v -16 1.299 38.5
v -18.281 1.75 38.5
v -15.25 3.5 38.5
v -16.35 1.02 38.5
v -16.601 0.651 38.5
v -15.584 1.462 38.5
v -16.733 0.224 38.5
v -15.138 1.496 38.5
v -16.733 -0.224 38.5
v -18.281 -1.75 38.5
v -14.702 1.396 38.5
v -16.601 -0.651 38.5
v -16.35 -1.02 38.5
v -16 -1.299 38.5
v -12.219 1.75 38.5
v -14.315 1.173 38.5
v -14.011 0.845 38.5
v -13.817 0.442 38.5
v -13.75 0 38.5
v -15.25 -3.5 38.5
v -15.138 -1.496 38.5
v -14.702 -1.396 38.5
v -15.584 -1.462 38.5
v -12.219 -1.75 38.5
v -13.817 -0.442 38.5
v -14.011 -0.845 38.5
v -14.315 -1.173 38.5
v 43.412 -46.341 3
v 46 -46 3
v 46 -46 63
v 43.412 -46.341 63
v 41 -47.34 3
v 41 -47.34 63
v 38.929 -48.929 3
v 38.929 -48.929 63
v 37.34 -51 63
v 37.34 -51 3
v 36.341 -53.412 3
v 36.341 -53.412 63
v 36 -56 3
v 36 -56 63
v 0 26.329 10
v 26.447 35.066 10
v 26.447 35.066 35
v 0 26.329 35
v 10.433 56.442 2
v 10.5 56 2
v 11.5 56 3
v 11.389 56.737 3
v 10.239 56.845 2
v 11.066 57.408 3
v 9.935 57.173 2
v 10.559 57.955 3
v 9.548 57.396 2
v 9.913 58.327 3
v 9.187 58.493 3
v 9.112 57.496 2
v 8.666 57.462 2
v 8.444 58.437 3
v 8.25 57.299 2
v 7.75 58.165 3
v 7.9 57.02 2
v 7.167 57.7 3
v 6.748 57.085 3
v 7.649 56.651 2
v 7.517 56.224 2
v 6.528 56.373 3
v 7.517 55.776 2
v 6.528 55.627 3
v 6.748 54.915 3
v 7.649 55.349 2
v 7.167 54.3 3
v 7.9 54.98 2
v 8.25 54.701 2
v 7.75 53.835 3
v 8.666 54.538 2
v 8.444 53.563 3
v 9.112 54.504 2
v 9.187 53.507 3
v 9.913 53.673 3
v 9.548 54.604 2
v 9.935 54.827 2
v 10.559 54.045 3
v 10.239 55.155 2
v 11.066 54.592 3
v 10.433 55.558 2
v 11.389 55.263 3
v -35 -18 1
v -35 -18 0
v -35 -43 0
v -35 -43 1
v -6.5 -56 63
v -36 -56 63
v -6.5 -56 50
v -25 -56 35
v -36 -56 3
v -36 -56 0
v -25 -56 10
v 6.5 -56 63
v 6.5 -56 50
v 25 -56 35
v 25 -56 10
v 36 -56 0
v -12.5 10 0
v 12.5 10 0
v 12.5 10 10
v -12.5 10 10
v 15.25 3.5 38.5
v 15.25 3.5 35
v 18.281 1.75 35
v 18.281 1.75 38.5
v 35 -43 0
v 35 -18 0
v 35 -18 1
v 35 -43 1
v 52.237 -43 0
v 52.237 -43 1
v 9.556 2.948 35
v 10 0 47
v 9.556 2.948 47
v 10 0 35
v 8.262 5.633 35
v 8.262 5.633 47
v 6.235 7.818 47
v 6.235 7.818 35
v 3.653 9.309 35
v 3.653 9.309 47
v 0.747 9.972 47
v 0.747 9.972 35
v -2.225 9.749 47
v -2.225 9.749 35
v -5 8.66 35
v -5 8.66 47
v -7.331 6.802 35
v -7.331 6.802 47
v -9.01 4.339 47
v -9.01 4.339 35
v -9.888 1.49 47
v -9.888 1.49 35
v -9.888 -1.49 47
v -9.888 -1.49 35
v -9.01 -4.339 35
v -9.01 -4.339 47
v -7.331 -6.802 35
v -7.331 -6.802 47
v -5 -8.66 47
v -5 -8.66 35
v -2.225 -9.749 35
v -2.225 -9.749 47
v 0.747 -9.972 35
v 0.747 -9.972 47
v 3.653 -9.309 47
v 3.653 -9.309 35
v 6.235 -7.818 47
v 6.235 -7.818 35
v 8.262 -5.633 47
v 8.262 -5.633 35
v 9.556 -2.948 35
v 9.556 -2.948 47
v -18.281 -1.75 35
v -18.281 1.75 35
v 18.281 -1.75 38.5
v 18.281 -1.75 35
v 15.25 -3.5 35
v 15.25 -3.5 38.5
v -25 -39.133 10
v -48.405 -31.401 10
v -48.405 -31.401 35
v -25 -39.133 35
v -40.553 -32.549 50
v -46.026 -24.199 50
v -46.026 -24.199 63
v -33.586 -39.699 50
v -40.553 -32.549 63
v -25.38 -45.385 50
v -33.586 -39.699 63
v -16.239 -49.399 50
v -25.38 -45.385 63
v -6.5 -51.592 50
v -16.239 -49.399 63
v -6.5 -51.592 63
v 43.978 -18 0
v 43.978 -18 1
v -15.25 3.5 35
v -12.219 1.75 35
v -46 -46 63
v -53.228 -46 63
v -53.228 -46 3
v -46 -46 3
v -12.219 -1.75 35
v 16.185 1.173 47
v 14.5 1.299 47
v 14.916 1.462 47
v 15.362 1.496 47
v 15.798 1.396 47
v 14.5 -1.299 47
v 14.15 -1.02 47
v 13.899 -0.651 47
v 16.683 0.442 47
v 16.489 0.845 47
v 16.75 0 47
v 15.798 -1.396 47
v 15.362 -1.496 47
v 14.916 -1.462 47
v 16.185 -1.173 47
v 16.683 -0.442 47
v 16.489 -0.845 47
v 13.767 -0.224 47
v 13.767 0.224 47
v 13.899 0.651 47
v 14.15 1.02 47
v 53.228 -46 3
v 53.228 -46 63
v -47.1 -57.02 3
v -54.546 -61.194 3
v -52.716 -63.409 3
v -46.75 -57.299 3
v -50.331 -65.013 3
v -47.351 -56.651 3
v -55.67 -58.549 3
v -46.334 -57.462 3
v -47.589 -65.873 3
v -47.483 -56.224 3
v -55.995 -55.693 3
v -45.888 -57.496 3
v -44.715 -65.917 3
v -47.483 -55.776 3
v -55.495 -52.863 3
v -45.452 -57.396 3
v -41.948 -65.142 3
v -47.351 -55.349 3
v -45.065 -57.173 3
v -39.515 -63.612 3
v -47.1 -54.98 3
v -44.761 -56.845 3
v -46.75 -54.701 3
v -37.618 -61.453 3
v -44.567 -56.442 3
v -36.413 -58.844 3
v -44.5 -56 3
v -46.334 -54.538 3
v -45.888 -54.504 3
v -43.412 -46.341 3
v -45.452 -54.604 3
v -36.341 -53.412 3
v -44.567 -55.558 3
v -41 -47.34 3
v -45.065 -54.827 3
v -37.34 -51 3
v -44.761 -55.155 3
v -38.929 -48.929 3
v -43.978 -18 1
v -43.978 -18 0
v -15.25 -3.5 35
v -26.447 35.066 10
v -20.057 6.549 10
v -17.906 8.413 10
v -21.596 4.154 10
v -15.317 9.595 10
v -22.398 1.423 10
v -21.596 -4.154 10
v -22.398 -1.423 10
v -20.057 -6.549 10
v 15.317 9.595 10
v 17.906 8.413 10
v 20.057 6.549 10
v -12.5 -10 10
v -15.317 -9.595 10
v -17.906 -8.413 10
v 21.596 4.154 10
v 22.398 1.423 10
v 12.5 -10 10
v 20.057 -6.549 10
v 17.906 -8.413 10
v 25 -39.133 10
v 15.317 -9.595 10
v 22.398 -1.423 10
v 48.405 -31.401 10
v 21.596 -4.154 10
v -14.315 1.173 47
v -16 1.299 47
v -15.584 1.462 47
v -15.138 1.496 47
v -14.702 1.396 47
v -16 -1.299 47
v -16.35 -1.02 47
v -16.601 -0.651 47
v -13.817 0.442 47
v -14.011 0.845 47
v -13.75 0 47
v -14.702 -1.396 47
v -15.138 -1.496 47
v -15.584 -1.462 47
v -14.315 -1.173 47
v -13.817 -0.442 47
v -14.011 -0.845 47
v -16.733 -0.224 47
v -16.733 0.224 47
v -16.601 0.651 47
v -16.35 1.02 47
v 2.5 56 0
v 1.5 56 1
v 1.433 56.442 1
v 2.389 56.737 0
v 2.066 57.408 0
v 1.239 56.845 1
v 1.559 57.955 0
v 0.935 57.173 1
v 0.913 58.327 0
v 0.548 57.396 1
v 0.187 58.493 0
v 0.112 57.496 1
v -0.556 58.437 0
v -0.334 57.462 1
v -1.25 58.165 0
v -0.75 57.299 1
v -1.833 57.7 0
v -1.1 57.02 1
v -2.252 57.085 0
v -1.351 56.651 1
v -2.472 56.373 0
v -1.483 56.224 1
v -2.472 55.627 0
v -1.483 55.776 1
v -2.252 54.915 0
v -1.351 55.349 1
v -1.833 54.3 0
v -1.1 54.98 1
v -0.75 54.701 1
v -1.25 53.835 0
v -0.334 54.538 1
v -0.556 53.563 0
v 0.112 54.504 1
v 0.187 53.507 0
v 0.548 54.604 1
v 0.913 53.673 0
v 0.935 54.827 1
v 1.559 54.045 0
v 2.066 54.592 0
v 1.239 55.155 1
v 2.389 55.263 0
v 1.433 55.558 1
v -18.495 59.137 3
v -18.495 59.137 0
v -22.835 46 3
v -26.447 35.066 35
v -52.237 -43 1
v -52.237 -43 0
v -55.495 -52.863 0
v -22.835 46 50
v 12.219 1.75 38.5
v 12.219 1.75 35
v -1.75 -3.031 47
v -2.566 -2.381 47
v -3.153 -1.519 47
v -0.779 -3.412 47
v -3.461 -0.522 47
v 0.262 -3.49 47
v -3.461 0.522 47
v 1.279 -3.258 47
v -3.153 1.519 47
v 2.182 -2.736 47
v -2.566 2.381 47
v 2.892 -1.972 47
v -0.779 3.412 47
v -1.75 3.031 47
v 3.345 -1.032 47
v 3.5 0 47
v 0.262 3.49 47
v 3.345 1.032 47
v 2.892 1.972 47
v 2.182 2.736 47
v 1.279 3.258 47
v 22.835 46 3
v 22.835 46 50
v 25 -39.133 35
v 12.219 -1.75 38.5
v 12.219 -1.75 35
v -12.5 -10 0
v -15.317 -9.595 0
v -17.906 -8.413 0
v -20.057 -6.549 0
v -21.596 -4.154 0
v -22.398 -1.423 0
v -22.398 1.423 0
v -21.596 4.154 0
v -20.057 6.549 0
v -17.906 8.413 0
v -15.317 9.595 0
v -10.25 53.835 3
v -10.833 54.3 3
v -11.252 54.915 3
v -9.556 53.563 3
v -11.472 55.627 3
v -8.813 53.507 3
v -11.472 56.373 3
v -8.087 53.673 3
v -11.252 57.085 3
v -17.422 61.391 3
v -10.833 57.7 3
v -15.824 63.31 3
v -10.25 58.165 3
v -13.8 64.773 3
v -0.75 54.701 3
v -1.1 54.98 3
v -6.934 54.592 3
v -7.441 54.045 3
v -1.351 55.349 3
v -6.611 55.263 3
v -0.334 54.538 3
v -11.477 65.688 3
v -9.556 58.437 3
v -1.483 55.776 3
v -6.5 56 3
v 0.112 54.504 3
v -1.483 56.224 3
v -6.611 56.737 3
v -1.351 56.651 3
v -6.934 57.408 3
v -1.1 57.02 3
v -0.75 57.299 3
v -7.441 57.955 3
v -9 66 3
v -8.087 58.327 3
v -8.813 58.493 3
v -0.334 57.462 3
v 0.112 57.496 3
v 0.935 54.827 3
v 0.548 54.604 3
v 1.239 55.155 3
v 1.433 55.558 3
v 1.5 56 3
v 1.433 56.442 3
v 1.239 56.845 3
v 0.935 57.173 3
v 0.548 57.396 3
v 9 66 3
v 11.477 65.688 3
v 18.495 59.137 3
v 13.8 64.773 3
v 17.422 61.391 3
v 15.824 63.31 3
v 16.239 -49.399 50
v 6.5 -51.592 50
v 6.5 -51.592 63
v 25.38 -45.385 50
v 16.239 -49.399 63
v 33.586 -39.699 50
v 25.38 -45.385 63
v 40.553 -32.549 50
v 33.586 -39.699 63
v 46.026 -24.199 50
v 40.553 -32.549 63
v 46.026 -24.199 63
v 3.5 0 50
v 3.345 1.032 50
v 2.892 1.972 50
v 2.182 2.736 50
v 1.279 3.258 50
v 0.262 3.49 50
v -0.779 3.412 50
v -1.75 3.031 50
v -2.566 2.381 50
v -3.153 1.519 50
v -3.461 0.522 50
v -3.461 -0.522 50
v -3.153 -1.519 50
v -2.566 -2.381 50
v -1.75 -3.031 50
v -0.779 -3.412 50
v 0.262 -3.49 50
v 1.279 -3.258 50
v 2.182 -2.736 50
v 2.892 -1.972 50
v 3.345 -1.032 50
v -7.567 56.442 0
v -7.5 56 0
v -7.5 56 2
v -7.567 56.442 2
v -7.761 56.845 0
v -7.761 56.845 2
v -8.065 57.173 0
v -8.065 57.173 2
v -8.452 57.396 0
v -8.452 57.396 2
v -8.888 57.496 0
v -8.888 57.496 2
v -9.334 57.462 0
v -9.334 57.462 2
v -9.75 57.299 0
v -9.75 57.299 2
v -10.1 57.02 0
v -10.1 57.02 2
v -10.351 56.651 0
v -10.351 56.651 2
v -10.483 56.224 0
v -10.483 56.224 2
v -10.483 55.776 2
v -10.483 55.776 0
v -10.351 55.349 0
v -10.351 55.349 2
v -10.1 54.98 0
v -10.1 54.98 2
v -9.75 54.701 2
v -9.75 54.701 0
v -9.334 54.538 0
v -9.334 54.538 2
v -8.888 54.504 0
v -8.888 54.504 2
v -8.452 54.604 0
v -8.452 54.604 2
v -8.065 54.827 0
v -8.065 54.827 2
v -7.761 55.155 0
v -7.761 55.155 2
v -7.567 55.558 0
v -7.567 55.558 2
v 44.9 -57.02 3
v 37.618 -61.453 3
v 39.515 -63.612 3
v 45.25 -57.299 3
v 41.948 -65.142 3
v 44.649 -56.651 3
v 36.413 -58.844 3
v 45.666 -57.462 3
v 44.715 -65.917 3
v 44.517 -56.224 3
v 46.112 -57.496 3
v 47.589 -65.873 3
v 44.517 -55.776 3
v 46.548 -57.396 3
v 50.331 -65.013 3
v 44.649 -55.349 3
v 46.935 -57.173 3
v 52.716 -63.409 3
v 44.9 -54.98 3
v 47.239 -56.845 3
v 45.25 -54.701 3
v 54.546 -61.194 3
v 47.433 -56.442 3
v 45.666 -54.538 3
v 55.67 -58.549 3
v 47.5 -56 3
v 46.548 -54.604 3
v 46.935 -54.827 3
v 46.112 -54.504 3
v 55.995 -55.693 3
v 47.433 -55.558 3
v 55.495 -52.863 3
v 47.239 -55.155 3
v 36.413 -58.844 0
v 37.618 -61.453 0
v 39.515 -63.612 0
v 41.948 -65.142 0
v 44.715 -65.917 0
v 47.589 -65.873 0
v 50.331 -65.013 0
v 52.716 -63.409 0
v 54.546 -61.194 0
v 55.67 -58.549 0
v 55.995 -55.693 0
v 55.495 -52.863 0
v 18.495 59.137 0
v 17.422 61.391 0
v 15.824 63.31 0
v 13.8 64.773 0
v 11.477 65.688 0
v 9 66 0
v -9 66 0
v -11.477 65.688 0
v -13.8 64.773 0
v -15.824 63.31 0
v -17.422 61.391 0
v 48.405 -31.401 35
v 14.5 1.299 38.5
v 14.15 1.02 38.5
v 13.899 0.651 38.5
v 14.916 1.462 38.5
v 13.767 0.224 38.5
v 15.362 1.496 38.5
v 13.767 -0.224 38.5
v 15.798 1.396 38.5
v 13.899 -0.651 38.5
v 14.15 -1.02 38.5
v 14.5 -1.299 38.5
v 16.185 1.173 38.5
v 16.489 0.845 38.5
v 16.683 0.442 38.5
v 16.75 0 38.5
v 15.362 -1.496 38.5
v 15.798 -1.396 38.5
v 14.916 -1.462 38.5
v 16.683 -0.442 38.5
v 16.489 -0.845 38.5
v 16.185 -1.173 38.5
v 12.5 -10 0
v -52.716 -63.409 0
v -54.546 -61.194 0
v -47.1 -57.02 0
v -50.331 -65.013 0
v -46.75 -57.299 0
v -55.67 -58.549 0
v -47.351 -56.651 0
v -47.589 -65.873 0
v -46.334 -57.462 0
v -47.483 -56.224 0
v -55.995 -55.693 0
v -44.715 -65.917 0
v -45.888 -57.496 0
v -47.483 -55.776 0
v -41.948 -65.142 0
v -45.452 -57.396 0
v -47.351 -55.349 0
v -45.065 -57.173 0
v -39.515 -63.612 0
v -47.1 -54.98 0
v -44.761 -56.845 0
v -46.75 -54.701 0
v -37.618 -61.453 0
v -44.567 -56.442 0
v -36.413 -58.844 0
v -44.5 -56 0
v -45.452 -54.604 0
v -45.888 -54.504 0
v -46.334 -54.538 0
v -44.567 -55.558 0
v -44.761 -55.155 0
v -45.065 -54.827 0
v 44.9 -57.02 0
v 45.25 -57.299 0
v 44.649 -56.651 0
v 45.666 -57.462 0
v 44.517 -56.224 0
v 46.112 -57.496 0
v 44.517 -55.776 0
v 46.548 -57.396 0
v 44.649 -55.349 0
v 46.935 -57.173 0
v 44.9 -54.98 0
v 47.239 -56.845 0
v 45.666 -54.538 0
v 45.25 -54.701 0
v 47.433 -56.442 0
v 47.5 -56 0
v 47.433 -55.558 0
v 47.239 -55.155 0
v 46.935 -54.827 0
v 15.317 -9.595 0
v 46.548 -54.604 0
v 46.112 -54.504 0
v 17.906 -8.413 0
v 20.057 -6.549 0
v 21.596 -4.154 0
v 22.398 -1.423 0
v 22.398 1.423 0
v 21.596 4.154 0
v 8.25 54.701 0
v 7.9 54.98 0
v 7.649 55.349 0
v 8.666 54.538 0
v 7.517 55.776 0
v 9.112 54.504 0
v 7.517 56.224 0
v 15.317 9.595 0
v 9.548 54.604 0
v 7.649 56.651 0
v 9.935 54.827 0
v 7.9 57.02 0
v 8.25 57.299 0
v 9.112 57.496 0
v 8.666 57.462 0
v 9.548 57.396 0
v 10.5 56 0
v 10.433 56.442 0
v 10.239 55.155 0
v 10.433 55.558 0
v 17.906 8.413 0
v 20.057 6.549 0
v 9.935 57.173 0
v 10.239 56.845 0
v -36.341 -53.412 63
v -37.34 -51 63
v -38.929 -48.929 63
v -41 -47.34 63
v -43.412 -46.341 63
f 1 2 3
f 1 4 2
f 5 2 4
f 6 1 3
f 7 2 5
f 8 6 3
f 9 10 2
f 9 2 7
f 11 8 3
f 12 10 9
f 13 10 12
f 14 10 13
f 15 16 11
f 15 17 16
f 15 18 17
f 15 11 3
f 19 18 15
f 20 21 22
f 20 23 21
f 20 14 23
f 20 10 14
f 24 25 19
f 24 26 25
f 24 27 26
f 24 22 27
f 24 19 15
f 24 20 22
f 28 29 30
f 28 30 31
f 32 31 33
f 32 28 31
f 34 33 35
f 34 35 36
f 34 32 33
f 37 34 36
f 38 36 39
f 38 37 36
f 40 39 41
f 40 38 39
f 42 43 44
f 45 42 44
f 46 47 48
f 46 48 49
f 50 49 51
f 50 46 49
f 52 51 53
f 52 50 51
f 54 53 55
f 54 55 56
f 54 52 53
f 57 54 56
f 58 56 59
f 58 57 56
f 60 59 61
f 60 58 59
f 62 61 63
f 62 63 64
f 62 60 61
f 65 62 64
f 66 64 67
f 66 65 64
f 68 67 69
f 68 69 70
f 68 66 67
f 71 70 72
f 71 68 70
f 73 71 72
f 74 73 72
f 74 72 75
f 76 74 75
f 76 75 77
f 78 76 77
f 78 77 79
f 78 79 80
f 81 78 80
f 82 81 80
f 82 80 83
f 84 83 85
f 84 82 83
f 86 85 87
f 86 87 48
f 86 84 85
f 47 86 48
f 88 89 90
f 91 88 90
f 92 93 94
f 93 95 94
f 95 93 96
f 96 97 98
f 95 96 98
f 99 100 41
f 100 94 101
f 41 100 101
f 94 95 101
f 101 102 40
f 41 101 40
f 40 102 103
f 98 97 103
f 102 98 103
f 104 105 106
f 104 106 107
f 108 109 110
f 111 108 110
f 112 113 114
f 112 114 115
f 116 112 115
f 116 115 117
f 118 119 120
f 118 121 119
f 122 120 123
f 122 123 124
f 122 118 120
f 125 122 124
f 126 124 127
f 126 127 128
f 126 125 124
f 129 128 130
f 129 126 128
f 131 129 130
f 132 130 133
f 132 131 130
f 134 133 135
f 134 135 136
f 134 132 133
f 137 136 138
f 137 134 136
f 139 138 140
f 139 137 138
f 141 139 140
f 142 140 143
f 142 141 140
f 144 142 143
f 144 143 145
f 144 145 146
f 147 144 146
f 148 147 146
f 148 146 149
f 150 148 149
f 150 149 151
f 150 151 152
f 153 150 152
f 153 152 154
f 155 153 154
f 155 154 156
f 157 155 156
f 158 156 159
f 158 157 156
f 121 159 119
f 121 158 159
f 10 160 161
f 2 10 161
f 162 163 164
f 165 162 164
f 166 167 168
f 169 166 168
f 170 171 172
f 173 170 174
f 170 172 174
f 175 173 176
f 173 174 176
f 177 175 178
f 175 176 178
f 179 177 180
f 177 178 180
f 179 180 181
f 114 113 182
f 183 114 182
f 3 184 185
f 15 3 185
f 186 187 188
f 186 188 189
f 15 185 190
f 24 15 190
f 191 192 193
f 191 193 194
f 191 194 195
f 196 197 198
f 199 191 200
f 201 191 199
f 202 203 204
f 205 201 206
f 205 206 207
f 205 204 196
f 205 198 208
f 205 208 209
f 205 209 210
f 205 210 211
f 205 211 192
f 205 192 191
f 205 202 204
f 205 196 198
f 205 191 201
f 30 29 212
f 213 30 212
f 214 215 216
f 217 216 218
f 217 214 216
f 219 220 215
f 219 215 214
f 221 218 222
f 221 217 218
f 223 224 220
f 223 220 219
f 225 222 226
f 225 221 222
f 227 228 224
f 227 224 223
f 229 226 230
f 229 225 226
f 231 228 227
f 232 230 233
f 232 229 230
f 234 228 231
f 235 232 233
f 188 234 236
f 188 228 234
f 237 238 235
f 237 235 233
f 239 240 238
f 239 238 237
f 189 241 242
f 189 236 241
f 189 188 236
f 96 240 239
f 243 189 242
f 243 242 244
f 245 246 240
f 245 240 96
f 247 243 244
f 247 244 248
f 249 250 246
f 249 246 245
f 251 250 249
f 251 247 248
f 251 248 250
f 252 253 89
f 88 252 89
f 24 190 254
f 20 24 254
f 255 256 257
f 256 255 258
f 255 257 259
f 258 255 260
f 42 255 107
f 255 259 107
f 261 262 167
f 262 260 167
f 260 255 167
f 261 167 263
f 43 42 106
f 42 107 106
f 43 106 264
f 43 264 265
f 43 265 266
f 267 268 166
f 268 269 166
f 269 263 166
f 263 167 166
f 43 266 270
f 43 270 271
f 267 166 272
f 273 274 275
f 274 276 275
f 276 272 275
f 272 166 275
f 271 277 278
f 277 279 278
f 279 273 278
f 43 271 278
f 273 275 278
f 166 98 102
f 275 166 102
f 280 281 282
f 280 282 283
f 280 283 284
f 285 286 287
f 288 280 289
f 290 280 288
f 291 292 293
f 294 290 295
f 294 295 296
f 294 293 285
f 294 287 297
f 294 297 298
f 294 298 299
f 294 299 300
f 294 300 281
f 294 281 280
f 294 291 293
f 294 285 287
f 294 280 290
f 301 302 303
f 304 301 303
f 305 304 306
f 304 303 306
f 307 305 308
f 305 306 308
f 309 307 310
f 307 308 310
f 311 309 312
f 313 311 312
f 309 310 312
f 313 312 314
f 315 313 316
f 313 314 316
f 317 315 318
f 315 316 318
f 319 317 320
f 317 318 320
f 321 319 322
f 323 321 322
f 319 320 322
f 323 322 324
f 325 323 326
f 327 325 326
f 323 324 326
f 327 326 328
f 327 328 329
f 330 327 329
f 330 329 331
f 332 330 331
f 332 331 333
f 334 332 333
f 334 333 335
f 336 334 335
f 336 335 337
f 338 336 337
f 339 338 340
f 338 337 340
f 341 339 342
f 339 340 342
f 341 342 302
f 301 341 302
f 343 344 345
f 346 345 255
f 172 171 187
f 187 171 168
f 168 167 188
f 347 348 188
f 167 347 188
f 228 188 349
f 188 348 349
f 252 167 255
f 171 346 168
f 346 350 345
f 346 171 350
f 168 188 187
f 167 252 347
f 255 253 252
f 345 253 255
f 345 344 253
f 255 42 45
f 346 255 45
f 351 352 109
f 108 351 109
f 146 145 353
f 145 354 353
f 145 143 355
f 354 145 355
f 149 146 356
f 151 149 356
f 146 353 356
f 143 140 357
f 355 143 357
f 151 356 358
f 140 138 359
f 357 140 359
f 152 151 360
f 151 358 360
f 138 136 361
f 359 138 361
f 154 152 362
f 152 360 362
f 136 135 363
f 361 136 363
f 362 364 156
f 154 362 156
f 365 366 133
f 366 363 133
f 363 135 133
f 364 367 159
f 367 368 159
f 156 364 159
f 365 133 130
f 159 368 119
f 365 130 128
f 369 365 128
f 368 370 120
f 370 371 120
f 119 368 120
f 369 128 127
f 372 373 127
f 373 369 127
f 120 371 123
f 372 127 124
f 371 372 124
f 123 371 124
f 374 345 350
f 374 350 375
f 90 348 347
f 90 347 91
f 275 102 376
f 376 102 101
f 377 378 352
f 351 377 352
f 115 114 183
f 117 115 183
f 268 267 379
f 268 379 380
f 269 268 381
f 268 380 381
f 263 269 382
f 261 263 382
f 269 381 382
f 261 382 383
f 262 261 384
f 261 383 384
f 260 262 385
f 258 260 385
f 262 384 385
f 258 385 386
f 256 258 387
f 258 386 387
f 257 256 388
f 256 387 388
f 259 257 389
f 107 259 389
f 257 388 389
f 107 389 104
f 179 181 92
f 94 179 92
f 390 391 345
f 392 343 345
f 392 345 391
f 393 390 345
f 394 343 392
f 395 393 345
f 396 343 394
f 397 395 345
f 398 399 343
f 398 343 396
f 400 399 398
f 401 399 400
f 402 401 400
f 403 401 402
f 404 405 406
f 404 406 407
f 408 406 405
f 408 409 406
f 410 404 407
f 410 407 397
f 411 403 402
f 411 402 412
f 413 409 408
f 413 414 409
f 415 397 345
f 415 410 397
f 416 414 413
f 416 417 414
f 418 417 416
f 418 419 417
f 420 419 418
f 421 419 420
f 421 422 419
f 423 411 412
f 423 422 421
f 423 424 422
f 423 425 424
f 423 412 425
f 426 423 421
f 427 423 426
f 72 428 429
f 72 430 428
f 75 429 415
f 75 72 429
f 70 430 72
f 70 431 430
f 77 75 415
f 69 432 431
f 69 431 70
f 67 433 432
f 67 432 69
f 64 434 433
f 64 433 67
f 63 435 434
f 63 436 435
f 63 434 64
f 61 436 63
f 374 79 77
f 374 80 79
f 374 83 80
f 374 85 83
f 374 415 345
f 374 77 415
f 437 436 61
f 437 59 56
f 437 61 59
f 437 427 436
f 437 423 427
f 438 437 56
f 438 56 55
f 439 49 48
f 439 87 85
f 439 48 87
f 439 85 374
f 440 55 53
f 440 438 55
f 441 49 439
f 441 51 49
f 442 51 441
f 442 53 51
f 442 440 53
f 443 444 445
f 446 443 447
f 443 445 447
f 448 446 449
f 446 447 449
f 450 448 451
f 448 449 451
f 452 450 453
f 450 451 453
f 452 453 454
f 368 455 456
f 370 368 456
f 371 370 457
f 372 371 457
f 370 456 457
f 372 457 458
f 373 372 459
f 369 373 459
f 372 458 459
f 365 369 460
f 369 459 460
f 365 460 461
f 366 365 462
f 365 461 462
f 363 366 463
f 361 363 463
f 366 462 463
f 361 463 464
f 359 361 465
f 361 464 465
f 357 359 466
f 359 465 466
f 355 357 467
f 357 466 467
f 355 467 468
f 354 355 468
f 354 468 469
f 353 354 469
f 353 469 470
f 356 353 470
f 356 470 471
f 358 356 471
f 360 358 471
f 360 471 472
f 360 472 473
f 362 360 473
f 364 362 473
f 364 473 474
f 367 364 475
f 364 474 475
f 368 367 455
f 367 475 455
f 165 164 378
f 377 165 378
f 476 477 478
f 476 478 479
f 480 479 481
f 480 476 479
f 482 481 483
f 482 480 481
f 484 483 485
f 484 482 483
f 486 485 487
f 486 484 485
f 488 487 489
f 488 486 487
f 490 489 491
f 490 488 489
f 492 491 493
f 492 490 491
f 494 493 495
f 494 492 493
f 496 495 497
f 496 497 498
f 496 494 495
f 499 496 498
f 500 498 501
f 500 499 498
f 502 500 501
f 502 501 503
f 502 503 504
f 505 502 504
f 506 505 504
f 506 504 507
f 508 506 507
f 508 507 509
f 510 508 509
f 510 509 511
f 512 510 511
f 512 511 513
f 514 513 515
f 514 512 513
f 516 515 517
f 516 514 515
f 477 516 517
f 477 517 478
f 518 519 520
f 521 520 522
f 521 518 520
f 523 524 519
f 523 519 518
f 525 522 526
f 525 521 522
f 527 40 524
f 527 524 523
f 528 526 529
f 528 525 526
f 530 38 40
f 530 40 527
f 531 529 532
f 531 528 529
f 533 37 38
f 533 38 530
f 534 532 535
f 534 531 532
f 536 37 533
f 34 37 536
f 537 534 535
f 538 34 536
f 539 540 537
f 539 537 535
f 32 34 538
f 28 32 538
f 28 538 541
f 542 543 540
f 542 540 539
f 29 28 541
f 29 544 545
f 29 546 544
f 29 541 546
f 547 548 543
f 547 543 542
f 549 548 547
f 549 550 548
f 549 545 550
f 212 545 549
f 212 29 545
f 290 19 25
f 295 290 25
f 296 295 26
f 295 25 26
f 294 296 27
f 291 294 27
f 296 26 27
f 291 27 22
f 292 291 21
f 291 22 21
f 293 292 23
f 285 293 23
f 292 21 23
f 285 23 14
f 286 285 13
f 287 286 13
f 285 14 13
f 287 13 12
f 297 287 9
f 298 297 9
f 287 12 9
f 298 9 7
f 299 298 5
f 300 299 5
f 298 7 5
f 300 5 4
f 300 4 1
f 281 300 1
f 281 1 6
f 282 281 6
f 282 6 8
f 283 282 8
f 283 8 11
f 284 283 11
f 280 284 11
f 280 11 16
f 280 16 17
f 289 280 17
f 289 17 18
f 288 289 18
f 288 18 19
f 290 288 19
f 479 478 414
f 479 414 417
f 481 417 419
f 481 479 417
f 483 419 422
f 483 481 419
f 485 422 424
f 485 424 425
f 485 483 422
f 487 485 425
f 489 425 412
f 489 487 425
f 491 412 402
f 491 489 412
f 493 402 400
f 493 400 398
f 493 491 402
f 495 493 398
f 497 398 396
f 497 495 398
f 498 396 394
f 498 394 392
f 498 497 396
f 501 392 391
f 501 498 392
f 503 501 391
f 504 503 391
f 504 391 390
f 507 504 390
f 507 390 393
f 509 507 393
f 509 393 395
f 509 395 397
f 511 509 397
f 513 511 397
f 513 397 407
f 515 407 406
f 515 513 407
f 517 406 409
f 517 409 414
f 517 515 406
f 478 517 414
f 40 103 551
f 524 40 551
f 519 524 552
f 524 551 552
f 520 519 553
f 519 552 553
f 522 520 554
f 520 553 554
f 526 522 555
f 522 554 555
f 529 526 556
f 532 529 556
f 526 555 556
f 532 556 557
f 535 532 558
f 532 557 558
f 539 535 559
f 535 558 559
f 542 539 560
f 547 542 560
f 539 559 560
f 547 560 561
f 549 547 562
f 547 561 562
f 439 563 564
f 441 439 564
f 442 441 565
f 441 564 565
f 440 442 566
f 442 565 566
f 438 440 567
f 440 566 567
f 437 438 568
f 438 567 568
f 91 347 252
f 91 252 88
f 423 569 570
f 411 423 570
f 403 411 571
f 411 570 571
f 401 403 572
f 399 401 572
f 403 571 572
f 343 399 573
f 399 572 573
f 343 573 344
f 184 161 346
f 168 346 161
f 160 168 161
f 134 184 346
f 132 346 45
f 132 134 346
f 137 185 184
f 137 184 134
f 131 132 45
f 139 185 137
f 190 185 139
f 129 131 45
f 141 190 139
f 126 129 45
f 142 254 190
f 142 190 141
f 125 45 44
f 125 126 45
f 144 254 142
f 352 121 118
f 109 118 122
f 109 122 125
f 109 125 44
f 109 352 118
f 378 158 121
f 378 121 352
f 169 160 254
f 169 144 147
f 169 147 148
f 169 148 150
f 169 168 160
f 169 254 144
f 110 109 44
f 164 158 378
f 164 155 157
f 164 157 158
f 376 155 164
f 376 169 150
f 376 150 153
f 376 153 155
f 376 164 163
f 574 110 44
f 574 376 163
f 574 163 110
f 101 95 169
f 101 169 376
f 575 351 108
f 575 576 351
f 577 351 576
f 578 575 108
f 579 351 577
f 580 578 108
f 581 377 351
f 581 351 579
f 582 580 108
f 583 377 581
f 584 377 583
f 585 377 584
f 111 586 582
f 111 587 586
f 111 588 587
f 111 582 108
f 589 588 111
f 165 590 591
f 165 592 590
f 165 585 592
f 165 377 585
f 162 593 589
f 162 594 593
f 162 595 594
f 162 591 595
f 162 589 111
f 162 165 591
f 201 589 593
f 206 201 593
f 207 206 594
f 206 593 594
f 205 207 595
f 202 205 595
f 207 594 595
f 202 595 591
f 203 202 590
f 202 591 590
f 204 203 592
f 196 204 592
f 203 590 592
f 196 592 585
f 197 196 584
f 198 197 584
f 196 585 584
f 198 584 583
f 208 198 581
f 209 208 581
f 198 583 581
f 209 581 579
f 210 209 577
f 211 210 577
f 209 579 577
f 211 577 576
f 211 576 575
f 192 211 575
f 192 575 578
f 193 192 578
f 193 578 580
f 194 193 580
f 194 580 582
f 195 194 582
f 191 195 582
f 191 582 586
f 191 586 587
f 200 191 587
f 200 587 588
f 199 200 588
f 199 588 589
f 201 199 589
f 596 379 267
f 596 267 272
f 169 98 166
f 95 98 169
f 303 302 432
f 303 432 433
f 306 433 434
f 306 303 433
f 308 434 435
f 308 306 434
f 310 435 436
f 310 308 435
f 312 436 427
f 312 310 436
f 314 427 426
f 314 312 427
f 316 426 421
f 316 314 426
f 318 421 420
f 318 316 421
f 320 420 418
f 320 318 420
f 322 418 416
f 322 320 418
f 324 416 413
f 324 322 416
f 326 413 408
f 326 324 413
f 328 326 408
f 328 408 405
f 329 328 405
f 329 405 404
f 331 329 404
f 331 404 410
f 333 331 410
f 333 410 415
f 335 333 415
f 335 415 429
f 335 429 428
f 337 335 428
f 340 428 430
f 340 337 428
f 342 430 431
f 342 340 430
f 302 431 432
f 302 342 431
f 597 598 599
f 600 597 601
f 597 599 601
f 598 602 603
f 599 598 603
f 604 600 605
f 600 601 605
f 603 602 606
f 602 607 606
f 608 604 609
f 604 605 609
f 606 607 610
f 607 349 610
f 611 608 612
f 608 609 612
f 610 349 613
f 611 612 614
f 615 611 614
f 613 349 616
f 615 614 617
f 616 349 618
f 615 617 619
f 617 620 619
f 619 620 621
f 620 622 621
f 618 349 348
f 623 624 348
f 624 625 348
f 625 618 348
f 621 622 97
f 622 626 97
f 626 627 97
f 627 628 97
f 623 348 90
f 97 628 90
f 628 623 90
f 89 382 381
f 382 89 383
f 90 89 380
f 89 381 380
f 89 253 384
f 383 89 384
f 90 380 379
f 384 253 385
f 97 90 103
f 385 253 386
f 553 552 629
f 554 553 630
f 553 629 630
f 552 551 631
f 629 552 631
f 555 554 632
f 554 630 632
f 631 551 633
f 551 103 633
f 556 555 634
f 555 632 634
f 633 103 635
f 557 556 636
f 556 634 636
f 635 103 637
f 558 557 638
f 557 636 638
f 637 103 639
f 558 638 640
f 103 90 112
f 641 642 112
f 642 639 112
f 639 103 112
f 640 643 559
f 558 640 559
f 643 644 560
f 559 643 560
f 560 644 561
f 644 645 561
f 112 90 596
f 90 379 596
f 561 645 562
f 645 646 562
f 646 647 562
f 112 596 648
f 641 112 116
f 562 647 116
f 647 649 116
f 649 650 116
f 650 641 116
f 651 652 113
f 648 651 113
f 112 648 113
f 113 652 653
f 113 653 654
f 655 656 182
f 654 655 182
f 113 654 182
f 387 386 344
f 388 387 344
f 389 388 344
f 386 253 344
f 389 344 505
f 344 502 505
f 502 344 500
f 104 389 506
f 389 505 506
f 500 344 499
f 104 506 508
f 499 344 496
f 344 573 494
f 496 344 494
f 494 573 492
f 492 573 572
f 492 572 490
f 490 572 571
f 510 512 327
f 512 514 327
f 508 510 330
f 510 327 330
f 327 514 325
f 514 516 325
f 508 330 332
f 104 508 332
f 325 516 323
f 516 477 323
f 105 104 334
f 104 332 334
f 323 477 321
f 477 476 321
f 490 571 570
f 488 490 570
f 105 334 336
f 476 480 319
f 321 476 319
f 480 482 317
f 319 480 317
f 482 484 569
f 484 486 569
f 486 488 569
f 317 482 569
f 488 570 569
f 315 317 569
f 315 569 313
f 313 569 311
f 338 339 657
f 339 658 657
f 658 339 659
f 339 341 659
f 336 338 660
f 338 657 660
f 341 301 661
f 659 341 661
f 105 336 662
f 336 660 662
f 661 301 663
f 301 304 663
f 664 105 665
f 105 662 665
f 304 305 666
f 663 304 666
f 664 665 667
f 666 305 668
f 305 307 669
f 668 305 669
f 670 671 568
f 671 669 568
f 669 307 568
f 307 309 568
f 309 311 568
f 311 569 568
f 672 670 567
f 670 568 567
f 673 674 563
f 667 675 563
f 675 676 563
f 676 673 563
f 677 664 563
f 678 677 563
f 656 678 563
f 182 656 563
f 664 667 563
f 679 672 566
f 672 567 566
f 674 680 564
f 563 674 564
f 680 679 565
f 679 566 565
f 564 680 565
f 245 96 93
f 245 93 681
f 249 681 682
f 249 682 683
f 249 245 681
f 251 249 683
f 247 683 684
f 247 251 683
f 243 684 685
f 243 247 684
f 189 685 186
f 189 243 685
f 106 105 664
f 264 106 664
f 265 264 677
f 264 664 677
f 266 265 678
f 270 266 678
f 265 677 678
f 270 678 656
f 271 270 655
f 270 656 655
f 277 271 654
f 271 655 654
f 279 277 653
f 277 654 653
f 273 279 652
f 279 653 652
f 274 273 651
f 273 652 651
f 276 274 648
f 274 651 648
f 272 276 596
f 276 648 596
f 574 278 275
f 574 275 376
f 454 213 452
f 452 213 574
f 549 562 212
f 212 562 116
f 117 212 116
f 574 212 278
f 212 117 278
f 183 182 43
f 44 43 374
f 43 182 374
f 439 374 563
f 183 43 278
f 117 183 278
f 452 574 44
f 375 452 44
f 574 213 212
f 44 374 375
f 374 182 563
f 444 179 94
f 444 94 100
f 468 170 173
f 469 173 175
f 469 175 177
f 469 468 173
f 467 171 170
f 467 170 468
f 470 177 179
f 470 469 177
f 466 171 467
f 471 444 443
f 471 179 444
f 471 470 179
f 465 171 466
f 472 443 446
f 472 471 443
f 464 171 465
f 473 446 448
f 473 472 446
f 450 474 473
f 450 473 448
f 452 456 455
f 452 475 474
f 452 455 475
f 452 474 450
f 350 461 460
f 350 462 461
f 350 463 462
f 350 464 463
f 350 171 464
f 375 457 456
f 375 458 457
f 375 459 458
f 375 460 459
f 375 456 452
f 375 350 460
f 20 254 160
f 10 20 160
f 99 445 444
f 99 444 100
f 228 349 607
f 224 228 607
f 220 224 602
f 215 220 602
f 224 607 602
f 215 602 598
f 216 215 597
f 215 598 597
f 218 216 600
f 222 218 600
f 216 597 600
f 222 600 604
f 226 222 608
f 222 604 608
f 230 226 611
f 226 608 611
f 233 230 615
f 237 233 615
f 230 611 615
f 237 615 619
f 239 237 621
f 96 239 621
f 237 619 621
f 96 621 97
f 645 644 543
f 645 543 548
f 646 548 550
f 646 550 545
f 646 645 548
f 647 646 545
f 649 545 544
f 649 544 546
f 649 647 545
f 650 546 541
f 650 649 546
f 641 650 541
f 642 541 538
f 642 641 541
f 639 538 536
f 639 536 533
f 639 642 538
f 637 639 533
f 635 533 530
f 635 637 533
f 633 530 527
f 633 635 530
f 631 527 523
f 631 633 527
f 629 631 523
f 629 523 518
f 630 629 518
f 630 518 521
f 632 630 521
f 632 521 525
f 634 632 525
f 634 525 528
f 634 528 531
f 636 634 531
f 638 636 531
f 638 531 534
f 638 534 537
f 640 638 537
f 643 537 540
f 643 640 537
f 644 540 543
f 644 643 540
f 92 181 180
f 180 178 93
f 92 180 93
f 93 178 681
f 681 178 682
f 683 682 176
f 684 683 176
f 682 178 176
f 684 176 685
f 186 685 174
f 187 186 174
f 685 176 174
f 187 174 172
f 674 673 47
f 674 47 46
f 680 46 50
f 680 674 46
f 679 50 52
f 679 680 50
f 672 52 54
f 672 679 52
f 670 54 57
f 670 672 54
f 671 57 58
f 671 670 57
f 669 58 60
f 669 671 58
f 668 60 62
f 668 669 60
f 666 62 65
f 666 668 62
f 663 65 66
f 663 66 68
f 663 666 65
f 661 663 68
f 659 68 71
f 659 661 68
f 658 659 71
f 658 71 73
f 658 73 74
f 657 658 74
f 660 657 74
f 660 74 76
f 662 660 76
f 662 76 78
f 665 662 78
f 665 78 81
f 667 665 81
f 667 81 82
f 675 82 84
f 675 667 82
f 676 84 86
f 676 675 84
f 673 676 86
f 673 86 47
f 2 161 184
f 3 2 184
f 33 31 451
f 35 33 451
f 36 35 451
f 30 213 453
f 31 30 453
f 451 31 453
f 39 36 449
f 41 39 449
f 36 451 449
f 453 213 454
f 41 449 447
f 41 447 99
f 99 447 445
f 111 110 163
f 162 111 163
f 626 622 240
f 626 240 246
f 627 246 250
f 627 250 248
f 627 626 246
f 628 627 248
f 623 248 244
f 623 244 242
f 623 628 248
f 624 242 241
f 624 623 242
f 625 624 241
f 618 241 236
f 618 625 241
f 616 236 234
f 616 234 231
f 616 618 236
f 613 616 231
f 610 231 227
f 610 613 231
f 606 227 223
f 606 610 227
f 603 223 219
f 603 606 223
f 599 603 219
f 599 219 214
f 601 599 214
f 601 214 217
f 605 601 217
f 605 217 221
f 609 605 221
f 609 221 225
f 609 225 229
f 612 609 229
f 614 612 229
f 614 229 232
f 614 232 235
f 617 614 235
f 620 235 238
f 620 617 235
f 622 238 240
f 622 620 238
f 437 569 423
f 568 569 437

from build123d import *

# Parameters (mm, degrees)
SKETCH_R        = 1.5
SKETCH_R_2      = 10
PAD_DEPTH       = 3
SKETCH001_R     = 10
PAD001_DEPTH    = 60
SKETCH004_W     = 70
SKETCH004_H     = 25
POCKET_DEPTH    = 30
SKETCH005_W     = 70
SKETCH005_H     = 25
POCKET001_DEPTH = 30
SKETCH006_W     = 50
SKETCH006_H     = 25
POCKET002_DEPTH = 80
POCKET003_DEPTH = 13
SKETCH008_R     = 10
SKETCH008_R_2   = 3.5
PAD002_DEPTH    = 3
CHAMFER001_SIZE = 1
SKETCH009_R     = 1.5
POCKET004_DEPTH = 12
POCKET005_DEPTH = 10
POCKET006_DEPTH = 3.5
SKETCH012_W     = 30
SKETCH012_H     = 25
POCKET007_DEPTH = 1


with BuildPart() as part:
    # Sketch → Pad (new body)
    with BuildSketch(Plane.XY):
        with BuildLine():
            ThreePointArc((-9.0000068257, 66), (-14.8579724019, 64.1045764441), (-18.4952748867, 59.1368383489))
            Line((-55.4952734203, -52.8631572125), (-18.4952748867, 59.1368383489))
            ThreePointArc((-55.4952734203, -52.8631572125), (-47.58859463, -65.8730120582), (-36, -56))
            Line((-36, -56), (36, -56))
            ThreePointArc((36, -56), (47.5886025397, -65.8730107855), (55.4952683942, -52.8631419983))
            Line((18.4952730609, 59.1368438754), (55.4952683942, -52.8631419983))
            ThreePointArc((18.4952730609, 59.1368438754), (14.8579671858, 64.1045802143), (8.9999997739, 66))
            Line((-9.0000068257, 66), (8.9999997739, 66))
        make_face()
        with Locations((-9, 56)):
            Circle(SKETCH_R, mode=Mode.SUBTRACT)
        with Locations((9, 56)):
            Circle(SKETCH_R, mode=Mode.SUBTRACT)
        with Locations((-46, -56)):
            Circle(SKETCH_R, mode=Mode.SUBTRACT)
        with Locations((46, -56)):
            Circle(SKETCH_R, mode=Mode.SUBTRACT)
        Circle(SKETCH_R_2, mode=Mode.SUBTRACT)
        with Locations((0, 56)):
            Circle(SKETCH_R, mode=Mode.SUBTRACT)
    extrude(amount=PAD_DEPTH)

    # Sketch001 (on Face16 of Pad) → Pad001 (join)
    with BuildSketch(Plane.XY.offset(3)):
        with BuildLine():
            ThreePointArc((-36, -56), (-38.9289322782, -48.9289320981), (-46.0000002547, -46))
            Line((-53.2279804126, -46), (-46.0000002547, -46))
            Line((-22.8351232698, 46), (-53.2279804126, -46))
            Line((-22.8351232698, 46), (22.8351232698, 46))
            Line((53.2279804126, -46), (22.8351232698, 46))
            Line((45.999999471, -46), (53.2279804126, -46))
            ThreePointArc((45.999999471, -46), (38.9289320011, -48.9289323752), (36, -56))
            Line((-36, -56), (36, -56))
        make_face()
        Circle(SKETCH001_R, mode=Mode.SUBTRACT)
    extrude(amount=PAD001_DEPTH)

    # Sketch004 (on Face25 of Pad001) → Pocket (cut)
    with BuildSketch(Plane(origin=(34.2893542942, 11.3277331151, 0), x_dir=(-0.3136832519, 0.9495276813, 0), z_dir=(0.9495276813, 0.3136832519, 0))):
        with Locations((-10, 22.5)):
            Rectangle(SKETCH004_W, SKETCH004_H)
    extrude(amount=-POCKET_DEPTH, mode=Mode.SUBTRACT)

    # Sketch005 (on Face9 of Pocket) → Pocket001 (cut)
    with BuildSketch(Plane(origin=(-34.2893542942, 11.3277331151, 0), x_dir=(-0.3136832519, -0.9495276813, 0), z_dir=(-0.9495276813, 0.3136832519, 0))):
        with Locations((10, 22.5)):
            Rectangle(SKETCH005_W, SKETCH005_H)
    extrude(amount=-POCKET001_DEPTH, mode=Mode.SUBTRACT)

    # Sketch006 (on Face27 of Pocket001) → Pocket002 (cut)
    with BuildSketch(Plane.XZ.offset(56)):
        with Locations((0, 22.5)):
            Rectangle(SKETCH006_W, SKETCH006_H)
    extrude(amount=-POCKET002_DEPTH, mode=Mode.SUBTRACT)

    # Sketch007 (on Face22 of Pocket002) → Pocket003 (cut)
    with BuildSketch(Plane.XY.offset(63)):
        with BuildLine():
            ThreePointArc((6.5, -51.5921505658), (0, 52), (-6.5, -51.5921505658))
            Line((-6.5, -51.5921505658), (-6.5, -56.5921505658))
            Line((6.5, -56.5921505658), (-6.5, -56.5921505658))
            Line((6.5, -51.5921505658), (6.5, -56.5921505658))
        make_face()
    extrude(amount=-POCKET003_DEPTH, mode=Mode.SUBTRACT)

    # Sketch008 → Pad002 (join)
    with BuildSketch(Plane.XY.offset(50)):
        Circle(SKETCH008_R)
        Circle(SKETCH008_R_2, mode=Mode.SUBTRACT)
    extrude(amount=-PAD002_DEPTH)

    # Chamfer001
    chamfer001_edges = [part.edges().sort_by_distance(p)[0] for p in [
        (7.5, 56, 3),
        (-10.5, 56, 3),
        (-1.5, 56, 0),
    ]]
    chamfer(chamfer001_edges, length=CHAMFER001_SIZE)

    # Sketch009 → Pocket004 (cut)
    with BuildSketch(Plane(origin=(0, 0, 35), x_dir=(1, 0, 0), z_dir=(0, 0, -1))):
        with Locations((-15.25, 0)):
            Circle(SKETCH009_R)
        with Locations((15.25, 0)):
            Circle(SKETCH009_R)
    extrude(amount=-POCKET004_DEPTH, mode=Mode.SUBTRACT)

    # Sketch010 → Pocket005 (cut)
    with BuildSketch(Plane(origin=(0, 0, 0), x_dir=(1, 0, 0), z_dir=(0, 0, -1))):
        with BuildLine():
            ThreePointArc((-12.4999765902, 10), (-22.5, 2e-10), (-12.4999765905, -10))
            Line((12.4999765907, -10), (-12.4999765905, -10))
            ThreePointArc((12.4999765907, -10), (22.5, 4e-10), (12.49997659, 10))
            Line((-12.4999765902, 10), (12.49997659, 10))
        make_face()
    extrude(amount=-POCKET005_DEPTH, mode=Mode.SUBTRACT)

    # Sketch011 (on Face62 of Pocket005) → Pocket006 (cut)
    with BuildSketch(Plane(origin=(0, 0, 35), x_dir=(1, 0, 0), z_dir=(0, 0, -1))):
        Polygon((-15.25, 3.5), (-18.2810889132, 1.75), (-18.2810889132, -1.75), (-15.25, -3.5), (-12.2189110868, -1.75), (-12.2189110868, 1.75), align=None)
        Polygon((15.25, 3.5), (12.2189110868, 1.75), (12.2189110868, -1.75), (15.25, -3.5), (18.2810889132, -1.75), (18.2810889132, 1.75), align=None)
    extrude(amount=-POCKET006_DEPTH, mode=Mode.SUBTRACT)

    # Sketch012 (on Face1 of Pocket006) → Pocket007 (cut)
    with BuildSketch(Plane(origin=(0, 0, 0), x_dir=(1, 0, 0), z_dir=(0, 0, -1))):
        with Locations((-50, 30.5)):
            Rectangle(SKETCH012_W, SKETCH012_H)
        with Locations((50, 30.5)):
            Rectangle(SKETCH012_W, SKETCH012_H)
    extrude(amount=-POCKET007_DEPTH, mode=Mode.SUBTRACT)


solid = part.part
